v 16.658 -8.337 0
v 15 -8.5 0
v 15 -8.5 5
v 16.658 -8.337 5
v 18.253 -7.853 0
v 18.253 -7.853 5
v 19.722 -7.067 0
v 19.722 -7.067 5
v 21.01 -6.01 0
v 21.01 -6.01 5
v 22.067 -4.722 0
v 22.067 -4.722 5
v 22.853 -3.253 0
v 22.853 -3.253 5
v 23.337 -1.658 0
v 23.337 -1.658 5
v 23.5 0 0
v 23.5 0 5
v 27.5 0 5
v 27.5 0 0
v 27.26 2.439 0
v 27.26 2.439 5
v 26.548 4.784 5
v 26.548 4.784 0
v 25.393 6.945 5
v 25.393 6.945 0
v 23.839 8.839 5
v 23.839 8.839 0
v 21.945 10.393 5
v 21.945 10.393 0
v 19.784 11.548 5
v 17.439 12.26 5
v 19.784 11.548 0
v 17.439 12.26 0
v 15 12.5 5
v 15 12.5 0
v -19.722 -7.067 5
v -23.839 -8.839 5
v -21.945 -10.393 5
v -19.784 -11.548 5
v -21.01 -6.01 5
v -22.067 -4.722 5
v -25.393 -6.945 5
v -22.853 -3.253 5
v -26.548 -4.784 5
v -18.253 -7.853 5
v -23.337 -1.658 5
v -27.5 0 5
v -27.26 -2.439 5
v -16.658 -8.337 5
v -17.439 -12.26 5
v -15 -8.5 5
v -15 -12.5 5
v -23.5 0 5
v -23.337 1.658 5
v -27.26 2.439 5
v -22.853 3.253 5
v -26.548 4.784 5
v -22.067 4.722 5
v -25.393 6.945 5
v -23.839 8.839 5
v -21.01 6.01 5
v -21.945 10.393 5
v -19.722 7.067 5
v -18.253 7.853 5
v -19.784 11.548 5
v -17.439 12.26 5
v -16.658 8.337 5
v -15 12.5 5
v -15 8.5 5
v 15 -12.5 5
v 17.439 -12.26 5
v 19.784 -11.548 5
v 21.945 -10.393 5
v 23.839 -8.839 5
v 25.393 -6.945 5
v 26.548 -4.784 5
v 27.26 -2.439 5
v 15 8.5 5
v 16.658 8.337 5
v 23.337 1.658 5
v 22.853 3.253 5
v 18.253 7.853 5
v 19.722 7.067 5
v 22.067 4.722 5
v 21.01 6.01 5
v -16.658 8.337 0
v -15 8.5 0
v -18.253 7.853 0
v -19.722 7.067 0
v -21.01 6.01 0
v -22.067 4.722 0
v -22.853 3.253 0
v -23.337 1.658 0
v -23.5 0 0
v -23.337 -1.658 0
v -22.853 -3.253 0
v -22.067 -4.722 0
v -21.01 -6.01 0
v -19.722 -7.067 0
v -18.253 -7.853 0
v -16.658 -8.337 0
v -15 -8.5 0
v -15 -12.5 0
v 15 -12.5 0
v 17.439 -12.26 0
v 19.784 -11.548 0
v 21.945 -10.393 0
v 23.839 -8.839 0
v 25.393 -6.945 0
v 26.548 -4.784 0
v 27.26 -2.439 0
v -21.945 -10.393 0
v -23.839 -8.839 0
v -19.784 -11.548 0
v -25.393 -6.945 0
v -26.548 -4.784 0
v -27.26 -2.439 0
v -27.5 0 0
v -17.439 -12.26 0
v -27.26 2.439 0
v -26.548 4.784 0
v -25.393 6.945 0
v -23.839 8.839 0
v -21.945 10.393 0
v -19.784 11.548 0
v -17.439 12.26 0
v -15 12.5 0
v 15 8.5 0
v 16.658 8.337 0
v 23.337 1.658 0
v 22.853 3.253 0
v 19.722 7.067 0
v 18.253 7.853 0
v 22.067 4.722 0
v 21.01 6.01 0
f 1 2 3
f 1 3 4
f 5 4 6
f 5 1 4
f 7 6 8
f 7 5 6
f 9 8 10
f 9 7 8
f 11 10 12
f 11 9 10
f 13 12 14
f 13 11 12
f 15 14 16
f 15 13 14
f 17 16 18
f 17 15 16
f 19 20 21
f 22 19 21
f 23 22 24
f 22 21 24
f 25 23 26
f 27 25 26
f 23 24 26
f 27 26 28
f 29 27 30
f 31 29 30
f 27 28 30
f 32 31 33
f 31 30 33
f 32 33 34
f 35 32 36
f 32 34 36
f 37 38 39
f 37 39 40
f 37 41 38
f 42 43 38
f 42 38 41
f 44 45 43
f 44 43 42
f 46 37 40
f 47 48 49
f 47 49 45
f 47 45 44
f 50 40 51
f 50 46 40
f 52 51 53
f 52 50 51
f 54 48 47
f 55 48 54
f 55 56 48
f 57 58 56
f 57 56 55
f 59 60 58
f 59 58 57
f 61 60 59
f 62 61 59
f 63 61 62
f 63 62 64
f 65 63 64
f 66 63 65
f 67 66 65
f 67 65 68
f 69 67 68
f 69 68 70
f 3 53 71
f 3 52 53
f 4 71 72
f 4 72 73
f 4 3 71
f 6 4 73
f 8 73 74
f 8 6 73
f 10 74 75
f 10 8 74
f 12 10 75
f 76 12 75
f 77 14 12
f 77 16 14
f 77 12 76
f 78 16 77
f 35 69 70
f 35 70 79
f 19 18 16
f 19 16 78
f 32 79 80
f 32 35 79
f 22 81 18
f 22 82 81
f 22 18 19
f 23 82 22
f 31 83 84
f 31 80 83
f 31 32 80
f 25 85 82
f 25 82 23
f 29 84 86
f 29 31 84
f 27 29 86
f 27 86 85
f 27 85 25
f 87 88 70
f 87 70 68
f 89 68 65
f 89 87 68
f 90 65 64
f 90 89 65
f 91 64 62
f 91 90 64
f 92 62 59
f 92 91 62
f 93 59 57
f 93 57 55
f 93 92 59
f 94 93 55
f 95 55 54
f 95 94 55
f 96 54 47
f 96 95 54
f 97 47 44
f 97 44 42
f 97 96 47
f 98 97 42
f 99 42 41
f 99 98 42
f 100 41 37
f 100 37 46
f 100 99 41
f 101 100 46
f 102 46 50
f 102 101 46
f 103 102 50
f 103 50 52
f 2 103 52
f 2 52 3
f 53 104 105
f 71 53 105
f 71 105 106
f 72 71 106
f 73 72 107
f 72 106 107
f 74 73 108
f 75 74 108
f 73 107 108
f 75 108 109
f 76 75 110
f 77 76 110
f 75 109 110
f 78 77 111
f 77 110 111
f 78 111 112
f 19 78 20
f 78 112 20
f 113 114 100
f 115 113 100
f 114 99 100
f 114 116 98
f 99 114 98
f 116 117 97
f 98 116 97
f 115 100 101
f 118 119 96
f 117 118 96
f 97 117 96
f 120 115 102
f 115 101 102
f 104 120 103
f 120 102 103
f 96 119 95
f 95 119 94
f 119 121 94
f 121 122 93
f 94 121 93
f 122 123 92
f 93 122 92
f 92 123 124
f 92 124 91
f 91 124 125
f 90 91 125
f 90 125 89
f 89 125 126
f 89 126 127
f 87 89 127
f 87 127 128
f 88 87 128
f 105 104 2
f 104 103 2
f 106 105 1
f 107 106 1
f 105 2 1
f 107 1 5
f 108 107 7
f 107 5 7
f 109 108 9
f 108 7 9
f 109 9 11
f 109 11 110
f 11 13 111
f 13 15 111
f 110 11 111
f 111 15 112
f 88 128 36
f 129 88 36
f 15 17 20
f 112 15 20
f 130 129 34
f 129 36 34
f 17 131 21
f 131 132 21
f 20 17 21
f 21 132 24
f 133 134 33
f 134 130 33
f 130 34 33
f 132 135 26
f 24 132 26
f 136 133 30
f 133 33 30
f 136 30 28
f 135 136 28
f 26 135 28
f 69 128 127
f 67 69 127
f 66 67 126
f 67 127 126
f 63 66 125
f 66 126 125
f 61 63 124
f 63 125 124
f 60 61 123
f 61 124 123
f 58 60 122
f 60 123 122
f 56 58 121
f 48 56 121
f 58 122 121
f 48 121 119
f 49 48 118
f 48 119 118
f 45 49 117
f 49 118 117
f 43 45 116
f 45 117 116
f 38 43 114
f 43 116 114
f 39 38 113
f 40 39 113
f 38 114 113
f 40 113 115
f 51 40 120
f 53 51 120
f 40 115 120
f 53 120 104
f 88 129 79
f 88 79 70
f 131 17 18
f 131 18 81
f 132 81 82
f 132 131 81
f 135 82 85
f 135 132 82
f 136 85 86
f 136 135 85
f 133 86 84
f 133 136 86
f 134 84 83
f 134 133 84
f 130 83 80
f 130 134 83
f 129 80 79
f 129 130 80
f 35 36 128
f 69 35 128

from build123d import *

# Parameters (mm, degrees)
F1_DEPTH = 5
F2_T     = -4


with BuildPart() as f1:
    # F0 (on Top) → F1 (new body)
    with BuildSketch(Plane.XY):
        with BuildLine():
            Line((-15, -12.5), (-15, 12.5))
            ThreePointArc((-15, 12.5), (-27.5, 0), (-15, -12.5))
        make_face()
        with BuildLine():
            ThreePointArc((-2.5, 0), (-6.161165, 8.838835), (-15, 12.5))
            Line((-15, 12.5), (-15, -12.5))
            ThreePointArc((-15, -12.5), (-6.161165, -8.838835), (-2.5, 0))
        make_face()
        with BuildLine():
            ThreePointArc((15, -12.5), (2.5, 0), (15, 12.5))
            Line((15, 12.5), (-15, 12.5))
            ThreePointArc((-15, 12.5), (-6.161165, 8.838835), (-2.5, 0))
            ThreePointArc((-2.5, 0), (-6.161165, -8.838835), (-15, -12.5))
            Line((-15, -12.5), (15, -12.5))
        make_face()
        with BuildLine():
            Line((15, -12.5), (15, 12.5))
            ThreePointArc((15, 12.5), (2.5, 0), (15, -12.5))
        make_face()
        with BuildLine():
            ThreePointArc((27.5, 0), (23.838835, 8.838835), (15, 12.5))
            Line((15, 12.5), (15, -12.5))
            ThreePointArc((15, -12.5), (23.838835, -8.838835), (27.5, 0))
        make_face()
    extrude(amount=F1_DEPTH)

    # F2
    f2_openings = [f1.faces().sort_by_distance(p)[0] for p in [
        (0, 0, 5),
        (0, 0, 0),
    ]]
    offset(amount=F2_T, openings=f2_openings)


solid = f1.part
